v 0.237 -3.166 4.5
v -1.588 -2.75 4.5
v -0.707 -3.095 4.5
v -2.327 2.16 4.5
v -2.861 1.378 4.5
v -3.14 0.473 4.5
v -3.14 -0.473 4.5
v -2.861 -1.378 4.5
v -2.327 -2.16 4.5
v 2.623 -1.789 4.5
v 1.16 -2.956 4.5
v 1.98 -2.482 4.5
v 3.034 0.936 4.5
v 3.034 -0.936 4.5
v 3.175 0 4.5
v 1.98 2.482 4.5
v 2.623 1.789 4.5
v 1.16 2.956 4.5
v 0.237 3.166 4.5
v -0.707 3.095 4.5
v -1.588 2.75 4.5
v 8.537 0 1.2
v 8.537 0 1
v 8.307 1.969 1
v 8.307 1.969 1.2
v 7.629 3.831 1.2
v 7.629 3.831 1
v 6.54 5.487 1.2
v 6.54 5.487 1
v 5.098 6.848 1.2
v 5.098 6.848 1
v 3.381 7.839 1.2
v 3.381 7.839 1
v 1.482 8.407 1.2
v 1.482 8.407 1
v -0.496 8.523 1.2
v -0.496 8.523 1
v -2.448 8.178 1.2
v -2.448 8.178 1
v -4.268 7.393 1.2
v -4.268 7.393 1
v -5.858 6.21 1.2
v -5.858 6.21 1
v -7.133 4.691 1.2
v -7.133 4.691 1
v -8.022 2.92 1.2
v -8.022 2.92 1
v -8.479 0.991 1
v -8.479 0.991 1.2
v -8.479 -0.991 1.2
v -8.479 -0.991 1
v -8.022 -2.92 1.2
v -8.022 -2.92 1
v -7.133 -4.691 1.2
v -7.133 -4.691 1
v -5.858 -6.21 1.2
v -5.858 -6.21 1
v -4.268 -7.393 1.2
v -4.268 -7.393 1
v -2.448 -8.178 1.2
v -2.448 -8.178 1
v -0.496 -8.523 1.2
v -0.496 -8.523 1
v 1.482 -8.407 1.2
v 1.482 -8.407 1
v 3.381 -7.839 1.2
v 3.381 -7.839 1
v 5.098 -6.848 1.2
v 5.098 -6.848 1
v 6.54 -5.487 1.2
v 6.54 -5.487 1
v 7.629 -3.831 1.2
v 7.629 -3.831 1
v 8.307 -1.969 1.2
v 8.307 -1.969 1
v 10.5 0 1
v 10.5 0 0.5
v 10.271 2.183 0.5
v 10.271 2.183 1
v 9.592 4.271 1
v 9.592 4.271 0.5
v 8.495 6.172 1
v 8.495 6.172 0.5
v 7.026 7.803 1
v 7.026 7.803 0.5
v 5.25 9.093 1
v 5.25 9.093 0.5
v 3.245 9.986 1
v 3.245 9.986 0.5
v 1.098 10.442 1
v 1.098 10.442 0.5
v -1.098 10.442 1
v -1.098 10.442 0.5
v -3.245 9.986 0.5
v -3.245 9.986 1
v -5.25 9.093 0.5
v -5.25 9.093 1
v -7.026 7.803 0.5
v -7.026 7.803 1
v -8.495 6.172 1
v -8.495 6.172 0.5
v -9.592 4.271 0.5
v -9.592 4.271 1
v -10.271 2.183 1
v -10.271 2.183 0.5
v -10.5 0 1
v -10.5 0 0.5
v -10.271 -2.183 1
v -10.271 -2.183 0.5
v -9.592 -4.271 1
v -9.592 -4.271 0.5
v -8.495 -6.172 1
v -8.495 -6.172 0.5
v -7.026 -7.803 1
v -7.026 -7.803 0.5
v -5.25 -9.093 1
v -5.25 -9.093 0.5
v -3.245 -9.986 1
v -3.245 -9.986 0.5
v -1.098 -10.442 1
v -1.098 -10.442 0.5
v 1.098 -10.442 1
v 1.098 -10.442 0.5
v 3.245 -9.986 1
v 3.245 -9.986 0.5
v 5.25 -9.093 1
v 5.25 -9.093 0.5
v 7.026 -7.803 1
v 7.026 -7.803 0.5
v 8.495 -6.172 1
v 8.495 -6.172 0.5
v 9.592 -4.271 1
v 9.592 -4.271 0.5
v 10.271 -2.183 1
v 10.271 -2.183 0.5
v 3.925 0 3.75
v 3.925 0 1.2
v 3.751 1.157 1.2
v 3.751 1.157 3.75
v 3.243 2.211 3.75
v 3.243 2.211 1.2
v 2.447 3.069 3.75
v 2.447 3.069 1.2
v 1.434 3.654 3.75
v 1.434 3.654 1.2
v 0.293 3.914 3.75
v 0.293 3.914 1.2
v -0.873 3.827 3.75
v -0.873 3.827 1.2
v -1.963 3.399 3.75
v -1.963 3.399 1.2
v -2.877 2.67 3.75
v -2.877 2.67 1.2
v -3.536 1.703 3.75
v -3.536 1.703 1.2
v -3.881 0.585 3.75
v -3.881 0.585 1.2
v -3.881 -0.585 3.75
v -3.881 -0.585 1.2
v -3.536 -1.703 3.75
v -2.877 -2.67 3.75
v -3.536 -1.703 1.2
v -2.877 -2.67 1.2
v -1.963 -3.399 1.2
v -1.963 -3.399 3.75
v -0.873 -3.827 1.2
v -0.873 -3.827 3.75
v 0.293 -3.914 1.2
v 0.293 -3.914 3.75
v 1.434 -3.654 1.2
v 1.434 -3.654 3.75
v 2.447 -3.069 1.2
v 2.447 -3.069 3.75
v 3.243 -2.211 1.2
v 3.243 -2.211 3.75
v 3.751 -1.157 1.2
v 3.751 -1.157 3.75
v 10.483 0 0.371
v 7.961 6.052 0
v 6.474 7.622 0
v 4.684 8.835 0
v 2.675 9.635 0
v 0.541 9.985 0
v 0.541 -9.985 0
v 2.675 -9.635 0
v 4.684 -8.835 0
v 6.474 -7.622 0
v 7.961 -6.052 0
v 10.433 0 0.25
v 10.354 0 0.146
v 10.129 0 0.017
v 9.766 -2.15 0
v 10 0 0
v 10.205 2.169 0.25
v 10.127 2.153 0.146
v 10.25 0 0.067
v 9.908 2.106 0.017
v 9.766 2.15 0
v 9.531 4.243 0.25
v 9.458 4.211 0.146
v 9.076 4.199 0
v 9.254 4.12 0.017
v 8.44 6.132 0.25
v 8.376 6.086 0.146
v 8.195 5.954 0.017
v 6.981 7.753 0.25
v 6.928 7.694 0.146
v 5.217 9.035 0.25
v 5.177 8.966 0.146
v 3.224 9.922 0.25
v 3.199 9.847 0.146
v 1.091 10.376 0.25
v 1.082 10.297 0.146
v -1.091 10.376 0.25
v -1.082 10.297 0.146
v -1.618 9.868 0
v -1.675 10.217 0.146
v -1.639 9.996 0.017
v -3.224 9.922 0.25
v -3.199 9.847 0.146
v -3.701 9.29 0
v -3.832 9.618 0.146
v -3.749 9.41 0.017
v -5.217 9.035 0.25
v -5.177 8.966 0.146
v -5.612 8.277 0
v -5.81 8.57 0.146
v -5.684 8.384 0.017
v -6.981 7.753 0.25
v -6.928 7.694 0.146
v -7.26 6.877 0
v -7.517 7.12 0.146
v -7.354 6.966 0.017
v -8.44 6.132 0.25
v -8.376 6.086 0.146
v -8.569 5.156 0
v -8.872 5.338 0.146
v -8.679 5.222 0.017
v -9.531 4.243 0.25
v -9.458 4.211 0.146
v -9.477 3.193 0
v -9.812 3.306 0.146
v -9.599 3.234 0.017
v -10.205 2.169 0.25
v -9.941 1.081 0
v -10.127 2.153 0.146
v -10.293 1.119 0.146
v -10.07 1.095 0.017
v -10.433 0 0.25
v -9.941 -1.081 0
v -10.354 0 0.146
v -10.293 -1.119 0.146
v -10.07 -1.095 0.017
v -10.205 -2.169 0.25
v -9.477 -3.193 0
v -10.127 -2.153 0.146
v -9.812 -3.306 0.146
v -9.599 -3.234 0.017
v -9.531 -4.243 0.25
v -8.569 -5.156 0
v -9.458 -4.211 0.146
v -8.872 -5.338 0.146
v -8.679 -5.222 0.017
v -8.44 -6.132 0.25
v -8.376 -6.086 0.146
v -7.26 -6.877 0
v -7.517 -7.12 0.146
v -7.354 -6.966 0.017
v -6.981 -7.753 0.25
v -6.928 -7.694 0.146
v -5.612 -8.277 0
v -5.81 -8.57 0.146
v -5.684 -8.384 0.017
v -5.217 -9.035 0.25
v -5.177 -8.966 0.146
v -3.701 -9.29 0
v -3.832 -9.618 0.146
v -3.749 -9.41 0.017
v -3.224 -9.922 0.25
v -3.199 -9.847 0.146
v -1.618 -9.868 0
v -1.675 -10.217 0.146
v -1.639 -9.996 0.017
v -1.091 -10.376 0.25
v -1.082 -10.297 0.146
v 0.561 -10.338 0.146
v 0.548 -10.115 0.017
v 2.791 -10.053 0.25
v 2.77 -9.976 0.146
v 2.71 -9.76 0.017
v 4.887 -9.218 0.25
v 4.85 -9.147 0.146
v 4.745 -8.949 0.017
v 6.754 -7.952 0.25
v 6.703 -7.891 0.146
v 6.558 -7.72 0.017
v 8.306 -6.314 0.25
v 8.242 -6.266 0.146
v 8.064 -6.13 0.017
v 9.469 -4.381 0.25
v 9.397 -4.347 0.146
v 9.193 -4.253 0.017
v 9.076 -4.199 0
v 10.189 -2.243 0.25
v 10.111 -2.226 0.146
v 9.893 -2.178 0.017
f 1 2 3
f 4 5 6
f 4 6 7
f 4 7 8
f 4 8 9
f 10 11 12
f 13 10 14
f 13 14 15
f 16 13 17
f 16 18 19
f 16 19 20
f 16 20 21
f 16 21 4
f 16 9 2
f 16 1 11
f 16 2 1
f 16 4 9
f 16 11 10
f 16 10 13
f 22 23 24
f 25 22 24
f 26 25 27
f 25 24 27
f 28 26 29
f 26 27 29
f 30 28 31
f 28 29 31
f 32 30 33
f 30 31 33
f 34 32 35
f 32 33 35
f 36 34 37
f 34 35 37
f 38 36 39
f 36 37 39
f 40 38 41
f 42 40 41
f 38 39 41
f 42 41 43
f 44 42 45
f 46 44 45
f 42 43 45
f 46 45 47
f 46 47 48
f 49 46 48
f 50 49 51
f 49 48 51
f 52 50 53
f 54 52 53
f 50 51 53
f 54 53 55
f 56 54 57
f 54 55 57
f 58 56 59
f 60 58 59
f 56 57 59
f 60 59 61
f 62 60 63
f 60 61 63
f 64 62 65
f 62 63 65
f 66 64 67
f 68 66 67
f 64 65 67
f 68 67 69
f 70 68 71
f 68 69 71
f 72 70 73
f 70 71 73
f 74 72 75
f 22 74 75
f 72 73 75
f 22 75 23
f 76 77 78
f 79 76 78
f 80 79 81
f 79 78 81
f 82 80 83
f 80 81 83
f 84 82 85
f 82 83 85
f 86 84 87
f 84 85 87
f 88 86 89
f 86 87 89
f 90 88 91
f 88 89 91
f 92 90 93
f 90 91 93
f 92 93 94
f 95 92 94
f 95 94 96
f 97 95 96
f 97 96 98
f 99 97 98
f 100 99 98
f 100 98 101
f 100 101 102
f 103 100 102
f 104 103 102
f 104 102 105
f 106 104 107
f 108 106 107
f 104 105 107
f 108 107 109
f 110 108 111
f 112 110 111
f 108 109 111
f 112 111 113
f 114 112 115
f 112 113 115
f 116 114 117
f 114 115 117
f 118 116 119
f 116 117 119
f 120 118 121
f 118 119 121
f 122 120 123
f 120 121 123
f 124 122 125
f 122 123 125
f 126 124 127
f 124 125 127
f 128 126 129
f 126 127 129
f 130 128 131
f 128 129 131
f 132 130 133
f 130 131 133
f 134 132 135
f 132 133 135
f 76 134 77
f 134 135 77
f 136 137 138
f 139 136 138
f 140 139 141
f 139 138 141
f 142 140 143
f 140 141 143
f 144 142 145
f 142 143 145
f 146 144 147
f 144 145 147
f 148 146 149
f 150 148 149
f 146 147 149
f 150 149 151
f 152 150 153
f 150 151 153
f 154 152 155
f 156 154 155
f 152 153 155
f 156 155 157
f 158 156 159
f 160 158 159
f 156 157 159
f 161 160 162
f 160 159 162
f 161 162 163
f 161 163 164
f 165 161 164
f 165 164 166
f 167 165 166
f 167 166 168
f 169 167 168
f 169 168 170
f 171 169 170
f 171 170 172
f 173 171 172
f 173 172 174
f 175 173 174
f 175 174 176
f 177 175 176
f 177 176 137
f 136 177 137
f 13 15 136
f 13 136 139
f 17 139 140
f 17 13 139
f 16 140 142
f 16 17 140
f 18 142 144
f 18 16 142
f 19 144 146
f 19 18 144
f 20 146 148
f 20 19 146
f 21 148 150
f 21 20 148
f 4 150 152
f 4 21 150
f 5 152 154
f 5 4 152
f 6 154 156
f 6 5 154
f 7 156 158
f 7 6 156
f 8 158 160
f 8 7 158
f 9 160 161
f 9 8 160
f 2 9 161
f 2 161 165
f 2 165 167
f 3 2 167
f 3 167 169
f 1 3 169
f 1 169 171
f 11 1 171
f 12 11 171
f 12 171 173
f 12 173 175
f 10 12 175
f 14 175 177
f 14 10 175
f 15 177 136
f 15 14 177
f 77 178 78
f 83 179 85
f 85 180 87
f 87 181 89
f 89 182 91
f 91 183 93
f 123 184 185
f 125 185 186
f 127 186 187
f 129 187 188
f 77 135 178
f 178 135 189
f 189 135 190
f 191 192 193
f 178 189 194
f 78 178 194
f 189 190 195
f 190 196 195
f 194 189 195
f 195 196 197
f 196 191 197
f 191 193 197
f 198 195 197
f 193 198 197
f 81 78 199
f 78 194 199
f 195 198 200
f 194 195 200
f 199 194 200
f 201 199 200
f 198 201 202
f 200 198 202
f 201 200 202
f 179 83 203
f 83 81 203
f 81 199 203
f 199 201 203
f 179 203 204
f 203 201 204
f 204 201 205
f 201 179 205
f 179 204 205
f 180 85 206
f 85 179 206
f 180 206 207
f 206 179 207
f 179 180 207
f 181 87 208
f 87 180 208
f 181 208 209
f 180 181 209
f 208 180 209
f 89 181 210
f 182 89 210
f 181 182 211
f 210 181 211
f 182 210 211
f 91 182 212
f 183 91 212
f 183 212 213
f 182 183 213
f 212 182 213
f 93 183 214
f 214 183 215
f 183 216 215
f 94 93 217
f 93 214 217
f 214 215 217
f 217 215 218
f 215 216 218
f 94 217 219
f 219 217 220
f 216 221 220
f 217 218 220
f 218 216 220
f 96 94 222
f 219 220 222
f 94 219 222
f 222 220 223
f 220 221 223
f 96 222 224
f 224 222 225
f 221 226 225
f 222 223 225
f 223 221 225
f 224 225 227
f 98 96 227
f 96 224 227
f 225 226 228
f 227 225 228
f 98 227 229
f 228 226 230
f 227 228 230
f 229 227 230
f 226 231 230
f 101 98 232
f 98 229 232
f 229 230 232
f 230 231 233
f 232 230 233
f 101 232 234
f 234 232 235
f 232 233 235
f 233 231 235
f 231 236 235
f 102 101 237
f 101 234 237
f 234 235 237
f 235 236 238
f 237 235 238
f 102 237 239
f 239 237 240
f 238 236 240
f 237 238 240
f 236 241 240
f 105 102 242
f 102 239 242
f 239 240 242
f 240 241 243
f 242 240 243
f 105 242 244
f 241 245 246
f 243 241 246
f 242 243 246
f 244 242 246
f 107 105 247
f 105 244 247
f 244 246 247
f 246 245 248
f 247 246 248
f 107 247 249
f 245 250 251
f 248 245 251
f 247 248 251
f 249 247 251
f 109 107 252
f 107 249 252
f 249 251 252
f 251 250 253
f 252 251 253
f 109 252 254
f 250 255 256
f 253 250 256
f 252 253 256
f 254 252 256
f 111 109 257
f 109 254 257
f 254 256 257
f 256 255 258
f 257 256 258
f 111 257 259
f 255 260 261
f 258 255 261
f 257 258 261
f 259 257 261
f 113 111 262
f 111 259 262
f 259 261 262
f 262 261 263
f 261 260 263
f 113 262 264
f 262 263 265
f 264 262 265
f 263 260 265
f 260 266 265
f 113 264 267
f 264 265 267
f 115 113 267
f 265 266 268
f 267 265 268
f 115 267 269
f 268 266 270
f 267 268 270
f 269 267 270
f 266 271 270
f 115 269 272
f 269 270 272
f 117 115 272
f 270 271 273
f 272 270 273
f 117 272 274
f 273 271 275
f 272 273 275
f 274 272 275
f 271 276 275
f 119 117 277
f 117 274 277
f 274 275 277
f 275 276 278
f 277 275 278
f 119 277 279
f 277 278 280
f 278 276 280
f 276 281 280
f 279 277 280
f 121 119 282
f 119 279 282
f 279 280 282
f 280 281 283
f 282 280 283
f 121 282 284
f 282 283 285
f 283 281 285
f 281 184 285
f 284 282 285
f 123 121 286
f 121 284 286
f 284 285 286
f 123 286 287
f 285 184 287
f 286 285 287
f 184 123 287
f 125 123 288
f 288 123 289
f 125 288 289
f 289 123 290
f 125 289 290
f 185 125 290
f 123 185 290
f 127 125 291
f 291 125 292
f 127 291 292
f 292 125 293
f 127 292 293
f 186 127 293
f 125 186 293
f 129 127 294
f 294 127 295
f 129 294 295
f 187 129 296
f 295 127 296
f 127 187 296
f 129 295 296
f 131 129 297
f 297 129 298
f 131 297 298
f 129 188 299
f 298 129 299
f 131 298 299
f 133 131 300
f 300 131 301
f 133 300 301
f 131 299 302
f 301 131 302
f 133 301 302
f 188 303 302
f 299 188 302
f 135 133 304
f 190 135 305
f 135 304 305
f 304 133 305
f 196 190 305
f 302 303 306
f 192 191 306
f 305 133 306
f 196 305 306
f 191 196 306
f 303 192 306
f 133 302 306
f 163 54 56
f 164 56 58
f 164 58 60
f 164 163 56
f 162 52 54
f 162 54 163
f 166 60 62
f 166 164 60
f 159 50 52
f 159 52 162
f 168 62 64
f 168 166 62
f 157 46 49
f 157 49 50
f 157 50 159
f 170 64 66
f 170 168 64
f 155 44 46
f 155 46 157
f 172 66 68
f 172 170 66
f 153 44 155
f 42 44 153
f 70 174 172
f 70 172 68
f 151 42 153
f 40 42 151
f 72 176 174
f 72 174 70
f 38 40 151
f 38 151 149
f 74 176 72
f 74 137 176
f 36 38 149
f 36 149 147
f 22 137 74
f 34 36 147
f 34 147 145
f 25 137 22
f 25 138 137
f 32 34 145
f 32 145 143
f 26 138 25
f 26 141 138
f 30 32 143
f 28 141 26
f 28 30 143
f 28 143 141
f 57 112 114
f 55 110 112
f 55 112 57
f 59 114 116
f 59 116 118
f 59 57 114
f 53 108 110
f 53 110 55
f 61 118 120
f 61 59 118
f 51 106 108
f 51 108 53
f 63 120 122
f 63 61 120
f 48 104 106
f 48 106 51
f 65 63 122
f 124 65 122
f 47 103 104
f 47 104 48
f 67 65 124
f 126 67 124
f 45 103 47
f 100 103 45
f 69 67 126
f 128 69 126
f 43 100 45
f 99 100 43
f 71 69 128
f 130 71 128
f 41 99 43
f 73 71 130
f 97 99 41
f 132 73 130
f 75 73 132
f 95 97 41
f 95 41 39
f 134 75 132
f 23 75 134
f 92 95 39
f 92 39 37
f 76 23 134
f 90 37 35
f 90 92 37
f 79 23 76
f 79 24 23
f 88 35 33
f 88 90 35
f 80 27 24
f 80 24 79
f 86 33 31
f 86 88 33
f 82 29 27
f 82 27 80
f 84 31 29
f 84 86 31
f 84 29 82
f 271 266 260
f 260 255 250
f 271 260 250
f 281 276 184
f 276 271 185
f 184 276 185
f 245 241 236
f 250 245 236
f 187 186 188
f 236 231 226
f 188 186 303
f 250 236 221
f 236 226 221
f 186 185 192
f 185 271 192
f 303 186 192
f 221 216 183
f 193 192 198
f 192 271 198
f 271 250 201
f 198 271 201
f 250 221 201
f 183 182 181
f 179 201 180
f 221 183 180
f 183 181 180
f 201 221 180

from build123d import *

# Parameters (mm, degrees)
F0_R     = 10.5
F1_DEPTH = 1
F2_R     = 3.925
F3_DEPTH = 3.5
F4_SIZE  = 0.75
F5_R     = 0.5
F6_R     = 8.536956
F7_DEPTH = 0.2


with BuildPart() as f1:
    # F0 (on Top) → F1 (new body)
    with BuildSketch(Plane.XY):
        Circle(F0_R)
    extrude(amount=F1_DEPTH)

    # F2 (on face) → F3 (join)
    with BuildSketch(Plane.XY.offset(1)):
        Circle(F2_R)
    extrude(amount=F3_DEPTH)

    # F4
    f4_edges = [f1.edges().sort_by_distance(p)[0] for p in [
        (-3.925, 0, 4.5),
    ]]
    chamfer(f4_edges, length=F4_SIZE)

    # F5
    f5_edges = [f1.edges().sort_by_distance(p)[0] for p in [
        (-10.5, 0, 0),
    ]]
    fillet(f5_edges, radius=F5_R)

    # F6 (on face) → F7 (join)
    with BuildSketch(Plane.XY.offset(1)):
        Circle(F6_R)
    extrude(amount=F7_DEPTH)


solid = f1.part
